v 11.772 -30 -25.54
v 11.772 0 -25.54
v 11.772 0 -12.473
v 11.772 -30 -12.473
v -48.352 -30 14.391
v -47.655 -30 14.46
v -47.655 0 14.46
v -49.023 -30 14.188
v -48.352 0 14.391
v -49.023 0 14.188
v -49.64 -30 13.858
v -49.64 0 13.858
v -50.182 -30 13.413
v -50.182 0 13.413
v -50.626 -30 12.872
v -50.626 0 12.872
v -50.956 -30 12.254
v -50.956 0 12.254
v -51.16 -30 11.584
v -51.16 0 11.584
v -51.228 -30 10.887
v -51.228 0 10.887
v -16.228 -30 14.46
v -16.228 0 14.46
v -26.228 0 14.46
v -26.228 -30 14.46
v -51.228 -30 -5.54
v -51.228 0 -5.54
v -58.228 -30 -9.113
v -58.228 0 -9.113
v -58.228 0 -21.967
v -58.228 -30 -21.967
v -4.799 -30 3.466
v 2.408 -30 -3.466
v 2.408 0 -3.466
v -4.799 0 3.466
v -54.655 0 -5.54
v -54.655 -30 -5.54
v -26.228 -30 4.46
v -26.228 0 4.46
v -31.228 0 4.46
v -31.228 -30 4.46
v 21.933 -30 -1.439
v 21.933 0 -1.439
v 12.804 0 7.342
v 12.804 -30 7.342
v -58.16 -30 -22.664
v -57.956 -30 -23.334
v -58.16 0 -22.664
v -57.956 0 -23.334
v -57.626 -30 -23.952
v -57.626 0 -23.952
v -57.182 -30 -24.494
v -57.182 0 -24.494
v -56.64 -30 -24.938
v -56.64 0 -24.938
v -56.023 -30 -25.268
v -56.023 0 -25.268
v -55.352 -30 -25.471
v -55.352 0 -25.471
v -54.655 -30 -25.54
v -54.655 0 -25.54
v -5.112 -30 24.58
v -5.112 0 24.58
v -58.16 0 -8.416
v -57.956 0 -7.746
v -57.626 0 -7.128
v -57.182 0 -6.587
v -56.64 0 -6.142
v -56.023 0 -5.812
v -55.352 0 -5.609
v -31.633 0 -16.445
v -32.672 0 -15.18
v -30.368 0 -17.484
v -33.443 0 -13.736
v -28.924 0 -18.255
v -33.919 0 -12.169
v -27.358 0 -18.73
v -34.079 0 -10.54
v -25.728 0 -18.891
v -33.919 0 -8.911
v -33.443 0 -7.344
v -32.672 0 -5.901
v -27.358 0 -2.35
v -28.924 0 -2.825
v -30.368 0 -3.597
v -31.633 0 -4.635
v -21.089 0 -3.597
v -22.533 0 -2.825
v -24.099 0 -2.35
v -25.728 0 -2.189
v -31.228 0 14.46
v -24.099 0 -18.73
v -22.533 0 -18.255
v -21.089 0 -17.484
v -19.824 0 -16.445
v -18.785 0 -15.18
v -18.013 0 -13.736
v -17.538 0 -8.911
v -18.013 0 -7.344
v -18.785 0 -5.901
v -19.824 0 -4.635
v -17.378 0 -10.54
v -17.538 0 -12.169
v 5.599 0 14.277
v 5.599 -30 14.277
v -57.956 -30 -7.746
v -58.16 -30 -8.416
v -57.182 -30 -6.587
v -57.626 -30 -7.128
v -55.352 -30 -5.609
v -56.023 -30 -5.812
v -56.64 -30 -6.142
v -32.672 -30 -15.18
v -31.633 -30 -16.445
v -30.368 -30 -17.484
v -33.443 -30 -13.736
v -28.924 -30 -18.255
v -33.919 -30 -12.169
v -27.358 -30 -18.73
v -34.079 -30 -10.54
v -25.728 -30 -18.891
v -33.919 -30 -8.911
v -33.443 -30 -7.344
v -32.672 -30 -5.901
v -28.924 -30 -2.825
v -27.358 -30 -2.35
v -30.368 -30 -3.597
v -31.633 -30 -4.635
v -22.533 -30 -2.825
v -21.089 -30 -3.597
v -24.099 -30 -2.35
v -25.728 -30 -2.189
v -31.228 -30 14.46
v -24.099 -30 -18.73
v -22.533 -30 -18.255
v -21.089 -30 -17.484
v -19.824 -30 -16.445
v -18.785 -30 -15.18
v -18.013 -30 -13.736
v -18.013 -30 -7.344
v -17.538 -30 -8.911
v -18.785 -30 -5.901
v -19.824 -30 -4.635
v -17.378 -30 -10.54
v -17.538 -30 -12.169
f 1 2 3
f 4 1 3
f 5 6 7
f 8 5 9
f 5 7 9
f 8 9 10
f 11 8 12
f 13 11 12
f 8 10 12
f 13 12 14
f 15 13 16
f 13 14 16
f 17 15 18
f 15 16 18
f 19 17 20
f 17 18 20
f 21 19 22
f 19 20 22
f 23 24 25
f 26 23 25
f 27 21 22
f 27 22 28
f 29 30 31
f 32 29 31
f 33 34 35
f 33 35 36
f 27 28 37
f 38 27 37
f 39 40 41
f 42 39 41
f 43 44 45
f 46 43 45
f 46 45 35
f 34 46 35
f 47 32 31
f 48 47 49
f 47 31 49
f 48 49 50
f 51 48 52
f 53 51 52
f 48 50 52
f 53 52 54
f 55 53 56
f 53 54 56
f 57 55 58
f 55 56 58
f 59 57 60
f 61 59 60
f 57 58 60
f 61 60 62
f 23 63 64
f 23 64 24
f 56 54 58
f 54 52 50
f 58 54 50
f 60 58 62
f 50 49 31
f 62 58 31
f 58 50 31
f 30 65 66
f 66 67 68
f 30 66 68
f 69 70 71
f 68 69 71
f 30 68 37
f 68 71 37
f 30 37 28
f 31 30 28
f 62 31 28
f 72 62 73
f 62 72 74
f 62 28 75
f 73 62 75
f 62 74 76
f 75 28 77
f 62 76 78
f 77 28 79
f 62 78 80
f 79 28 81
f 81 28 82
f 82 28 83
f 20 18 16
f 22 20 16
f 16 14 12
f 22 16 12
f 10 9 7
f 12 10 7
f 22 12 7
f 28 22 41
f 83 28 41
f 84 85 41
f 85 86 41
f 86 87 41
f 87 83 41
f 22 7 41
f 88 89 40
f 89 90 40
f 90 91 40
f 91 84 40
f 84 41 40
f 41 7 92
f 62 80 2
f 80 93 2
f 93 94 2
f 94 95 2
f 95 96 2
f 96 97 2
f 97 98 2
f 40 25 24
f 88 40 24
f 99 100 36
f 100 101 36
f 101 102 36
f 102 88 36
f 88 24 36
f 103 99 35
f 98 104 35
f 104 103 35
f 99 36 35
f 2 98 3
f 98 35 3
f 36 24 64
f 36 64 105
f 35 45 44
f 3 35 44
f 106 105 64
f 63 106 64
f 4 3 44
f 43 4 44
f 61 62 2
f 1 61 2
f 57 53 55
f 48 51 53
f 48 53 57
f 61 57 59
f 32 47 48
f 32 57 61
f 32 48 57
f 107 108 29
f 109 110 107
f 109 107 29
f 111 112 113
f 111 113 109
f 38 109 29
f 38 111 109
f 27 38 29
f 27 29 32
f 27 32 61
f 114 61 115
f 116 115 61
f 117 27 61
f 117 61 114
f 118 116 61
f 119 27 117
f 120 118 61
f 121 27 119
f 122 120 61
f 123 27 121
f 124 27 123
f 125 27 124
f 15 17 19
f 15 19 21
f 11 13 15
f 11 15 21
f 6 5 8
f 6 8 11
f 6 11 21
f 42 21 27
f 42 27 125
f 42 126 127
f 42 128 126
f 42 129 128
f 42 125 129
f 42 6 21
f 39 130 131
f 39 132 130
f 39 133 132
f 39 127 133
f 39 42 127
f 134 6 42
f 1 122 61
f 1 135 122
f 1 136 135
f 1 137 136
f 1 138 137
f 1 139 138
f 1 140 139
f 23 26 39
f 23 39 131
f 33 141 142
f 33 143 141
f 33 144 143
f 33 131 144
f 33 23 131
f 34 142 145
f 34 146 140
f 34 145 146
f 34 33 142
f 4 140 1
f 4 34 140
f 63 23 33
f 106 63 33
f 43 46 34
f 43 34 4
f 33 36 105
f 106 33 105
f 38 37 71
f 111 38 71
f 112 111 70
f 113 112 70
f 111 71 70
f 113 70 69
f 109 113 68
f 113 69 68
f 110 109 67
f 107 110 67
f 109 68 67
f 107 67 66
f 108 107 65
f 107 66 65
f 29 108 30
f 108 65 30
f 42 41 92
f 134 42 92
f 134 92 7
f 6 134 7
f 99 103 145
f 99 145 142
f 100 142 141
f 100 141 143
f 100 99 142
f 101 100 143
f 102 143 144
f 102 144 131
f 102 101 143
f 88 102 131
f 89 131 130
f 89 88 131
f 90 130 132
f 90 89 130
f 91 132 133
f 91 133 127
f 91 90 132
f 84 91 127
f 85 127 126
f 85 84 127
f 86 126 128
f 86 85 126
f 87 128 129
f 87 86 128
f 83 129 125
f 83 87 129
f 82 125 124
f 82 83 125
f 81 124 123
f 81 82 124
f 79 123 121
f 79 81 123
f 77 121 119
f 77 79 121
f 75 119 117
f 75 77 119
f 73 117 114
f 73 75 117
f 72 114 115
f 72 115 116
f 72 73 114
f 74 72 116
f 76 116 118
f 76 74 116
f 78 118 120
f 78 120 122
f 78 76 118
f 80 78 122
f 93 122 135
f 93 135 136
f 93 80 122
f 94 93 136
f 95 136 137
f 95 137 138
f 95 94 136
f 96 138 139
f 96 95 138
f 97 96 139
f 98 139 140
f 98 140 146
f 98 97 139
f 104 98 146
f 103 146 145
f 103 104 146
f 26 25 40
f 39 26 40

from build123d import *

# Parameters (mm, degrees)
F0_R     = 8.350726
F1_DEPTH = 30


with BuildPart() as f1:
    # F0 (on Front) → F1 (new body)
    with BuildSketch(Plane.XZ):
        with BuildLine():
            Line((-54.655215, -25.540138), (11.771582, -25.540138))
            Line((11.771582, -25.540138), (11.771582, -12.473472))
            Line((11.771582, -12.473472), (21.932656, -1.439317))
            Line((21.932656, -1.439317), (12.803844, 7.34173))
            Line((12.803844, 7.34173), (2.407616, -3.466229))
            Line((2.407616, -3.466229), (-4.799395, 3.466229))
            Line((-4.799395, 3.466229), (5.599293, 14.276747))
            Line((5.599293, 14.276747), (-5.112314, 24.580292))
            Line((-5.112314, 24.580292), (-16.22842, 14.459862))
            Line((-16.22842, 14.459862), (-26.22842, 14.459862))
            Line((-26.22842, 14.459862), (-26.22842, 4.459862))
            Line((-26.22842, 4.459862), (-31.22842, 4.459862))
            Line((-31.22842, 4.459862), (-31.22842, 14.459862))
            Line((-31.22842, 14.459862), (-47.655217, 14.459862))
            ThreePointArc((-47.655217, 14.459862), (-50.181853, 13.413295), (-51.22842, 10.886659))
            Line((-51.22842, 10.886659), (-51.22842, -5.540138))
            Line((-51.22842, -5.540138), (-54.655215, -5.540138))
            ThreePointArc((-54.655215, -5.540138), (-57.181851, -6.586705), (-58.228418, -9.113341))
            Line((-58.228418, -9.113341), (-58.228418, -21.966935))
            ThreePointArc((-58.228418, -21.966935), (-57.181851, -24.493571), (-54.655215, -25.540138))
        make_face()
        with Locations((-25.728418, -10.540138)):
            Circle(F0_R, mode=Mode.SUBTRACT)
    extrude(amount=F1_DEPTH)


solid = f1.part
